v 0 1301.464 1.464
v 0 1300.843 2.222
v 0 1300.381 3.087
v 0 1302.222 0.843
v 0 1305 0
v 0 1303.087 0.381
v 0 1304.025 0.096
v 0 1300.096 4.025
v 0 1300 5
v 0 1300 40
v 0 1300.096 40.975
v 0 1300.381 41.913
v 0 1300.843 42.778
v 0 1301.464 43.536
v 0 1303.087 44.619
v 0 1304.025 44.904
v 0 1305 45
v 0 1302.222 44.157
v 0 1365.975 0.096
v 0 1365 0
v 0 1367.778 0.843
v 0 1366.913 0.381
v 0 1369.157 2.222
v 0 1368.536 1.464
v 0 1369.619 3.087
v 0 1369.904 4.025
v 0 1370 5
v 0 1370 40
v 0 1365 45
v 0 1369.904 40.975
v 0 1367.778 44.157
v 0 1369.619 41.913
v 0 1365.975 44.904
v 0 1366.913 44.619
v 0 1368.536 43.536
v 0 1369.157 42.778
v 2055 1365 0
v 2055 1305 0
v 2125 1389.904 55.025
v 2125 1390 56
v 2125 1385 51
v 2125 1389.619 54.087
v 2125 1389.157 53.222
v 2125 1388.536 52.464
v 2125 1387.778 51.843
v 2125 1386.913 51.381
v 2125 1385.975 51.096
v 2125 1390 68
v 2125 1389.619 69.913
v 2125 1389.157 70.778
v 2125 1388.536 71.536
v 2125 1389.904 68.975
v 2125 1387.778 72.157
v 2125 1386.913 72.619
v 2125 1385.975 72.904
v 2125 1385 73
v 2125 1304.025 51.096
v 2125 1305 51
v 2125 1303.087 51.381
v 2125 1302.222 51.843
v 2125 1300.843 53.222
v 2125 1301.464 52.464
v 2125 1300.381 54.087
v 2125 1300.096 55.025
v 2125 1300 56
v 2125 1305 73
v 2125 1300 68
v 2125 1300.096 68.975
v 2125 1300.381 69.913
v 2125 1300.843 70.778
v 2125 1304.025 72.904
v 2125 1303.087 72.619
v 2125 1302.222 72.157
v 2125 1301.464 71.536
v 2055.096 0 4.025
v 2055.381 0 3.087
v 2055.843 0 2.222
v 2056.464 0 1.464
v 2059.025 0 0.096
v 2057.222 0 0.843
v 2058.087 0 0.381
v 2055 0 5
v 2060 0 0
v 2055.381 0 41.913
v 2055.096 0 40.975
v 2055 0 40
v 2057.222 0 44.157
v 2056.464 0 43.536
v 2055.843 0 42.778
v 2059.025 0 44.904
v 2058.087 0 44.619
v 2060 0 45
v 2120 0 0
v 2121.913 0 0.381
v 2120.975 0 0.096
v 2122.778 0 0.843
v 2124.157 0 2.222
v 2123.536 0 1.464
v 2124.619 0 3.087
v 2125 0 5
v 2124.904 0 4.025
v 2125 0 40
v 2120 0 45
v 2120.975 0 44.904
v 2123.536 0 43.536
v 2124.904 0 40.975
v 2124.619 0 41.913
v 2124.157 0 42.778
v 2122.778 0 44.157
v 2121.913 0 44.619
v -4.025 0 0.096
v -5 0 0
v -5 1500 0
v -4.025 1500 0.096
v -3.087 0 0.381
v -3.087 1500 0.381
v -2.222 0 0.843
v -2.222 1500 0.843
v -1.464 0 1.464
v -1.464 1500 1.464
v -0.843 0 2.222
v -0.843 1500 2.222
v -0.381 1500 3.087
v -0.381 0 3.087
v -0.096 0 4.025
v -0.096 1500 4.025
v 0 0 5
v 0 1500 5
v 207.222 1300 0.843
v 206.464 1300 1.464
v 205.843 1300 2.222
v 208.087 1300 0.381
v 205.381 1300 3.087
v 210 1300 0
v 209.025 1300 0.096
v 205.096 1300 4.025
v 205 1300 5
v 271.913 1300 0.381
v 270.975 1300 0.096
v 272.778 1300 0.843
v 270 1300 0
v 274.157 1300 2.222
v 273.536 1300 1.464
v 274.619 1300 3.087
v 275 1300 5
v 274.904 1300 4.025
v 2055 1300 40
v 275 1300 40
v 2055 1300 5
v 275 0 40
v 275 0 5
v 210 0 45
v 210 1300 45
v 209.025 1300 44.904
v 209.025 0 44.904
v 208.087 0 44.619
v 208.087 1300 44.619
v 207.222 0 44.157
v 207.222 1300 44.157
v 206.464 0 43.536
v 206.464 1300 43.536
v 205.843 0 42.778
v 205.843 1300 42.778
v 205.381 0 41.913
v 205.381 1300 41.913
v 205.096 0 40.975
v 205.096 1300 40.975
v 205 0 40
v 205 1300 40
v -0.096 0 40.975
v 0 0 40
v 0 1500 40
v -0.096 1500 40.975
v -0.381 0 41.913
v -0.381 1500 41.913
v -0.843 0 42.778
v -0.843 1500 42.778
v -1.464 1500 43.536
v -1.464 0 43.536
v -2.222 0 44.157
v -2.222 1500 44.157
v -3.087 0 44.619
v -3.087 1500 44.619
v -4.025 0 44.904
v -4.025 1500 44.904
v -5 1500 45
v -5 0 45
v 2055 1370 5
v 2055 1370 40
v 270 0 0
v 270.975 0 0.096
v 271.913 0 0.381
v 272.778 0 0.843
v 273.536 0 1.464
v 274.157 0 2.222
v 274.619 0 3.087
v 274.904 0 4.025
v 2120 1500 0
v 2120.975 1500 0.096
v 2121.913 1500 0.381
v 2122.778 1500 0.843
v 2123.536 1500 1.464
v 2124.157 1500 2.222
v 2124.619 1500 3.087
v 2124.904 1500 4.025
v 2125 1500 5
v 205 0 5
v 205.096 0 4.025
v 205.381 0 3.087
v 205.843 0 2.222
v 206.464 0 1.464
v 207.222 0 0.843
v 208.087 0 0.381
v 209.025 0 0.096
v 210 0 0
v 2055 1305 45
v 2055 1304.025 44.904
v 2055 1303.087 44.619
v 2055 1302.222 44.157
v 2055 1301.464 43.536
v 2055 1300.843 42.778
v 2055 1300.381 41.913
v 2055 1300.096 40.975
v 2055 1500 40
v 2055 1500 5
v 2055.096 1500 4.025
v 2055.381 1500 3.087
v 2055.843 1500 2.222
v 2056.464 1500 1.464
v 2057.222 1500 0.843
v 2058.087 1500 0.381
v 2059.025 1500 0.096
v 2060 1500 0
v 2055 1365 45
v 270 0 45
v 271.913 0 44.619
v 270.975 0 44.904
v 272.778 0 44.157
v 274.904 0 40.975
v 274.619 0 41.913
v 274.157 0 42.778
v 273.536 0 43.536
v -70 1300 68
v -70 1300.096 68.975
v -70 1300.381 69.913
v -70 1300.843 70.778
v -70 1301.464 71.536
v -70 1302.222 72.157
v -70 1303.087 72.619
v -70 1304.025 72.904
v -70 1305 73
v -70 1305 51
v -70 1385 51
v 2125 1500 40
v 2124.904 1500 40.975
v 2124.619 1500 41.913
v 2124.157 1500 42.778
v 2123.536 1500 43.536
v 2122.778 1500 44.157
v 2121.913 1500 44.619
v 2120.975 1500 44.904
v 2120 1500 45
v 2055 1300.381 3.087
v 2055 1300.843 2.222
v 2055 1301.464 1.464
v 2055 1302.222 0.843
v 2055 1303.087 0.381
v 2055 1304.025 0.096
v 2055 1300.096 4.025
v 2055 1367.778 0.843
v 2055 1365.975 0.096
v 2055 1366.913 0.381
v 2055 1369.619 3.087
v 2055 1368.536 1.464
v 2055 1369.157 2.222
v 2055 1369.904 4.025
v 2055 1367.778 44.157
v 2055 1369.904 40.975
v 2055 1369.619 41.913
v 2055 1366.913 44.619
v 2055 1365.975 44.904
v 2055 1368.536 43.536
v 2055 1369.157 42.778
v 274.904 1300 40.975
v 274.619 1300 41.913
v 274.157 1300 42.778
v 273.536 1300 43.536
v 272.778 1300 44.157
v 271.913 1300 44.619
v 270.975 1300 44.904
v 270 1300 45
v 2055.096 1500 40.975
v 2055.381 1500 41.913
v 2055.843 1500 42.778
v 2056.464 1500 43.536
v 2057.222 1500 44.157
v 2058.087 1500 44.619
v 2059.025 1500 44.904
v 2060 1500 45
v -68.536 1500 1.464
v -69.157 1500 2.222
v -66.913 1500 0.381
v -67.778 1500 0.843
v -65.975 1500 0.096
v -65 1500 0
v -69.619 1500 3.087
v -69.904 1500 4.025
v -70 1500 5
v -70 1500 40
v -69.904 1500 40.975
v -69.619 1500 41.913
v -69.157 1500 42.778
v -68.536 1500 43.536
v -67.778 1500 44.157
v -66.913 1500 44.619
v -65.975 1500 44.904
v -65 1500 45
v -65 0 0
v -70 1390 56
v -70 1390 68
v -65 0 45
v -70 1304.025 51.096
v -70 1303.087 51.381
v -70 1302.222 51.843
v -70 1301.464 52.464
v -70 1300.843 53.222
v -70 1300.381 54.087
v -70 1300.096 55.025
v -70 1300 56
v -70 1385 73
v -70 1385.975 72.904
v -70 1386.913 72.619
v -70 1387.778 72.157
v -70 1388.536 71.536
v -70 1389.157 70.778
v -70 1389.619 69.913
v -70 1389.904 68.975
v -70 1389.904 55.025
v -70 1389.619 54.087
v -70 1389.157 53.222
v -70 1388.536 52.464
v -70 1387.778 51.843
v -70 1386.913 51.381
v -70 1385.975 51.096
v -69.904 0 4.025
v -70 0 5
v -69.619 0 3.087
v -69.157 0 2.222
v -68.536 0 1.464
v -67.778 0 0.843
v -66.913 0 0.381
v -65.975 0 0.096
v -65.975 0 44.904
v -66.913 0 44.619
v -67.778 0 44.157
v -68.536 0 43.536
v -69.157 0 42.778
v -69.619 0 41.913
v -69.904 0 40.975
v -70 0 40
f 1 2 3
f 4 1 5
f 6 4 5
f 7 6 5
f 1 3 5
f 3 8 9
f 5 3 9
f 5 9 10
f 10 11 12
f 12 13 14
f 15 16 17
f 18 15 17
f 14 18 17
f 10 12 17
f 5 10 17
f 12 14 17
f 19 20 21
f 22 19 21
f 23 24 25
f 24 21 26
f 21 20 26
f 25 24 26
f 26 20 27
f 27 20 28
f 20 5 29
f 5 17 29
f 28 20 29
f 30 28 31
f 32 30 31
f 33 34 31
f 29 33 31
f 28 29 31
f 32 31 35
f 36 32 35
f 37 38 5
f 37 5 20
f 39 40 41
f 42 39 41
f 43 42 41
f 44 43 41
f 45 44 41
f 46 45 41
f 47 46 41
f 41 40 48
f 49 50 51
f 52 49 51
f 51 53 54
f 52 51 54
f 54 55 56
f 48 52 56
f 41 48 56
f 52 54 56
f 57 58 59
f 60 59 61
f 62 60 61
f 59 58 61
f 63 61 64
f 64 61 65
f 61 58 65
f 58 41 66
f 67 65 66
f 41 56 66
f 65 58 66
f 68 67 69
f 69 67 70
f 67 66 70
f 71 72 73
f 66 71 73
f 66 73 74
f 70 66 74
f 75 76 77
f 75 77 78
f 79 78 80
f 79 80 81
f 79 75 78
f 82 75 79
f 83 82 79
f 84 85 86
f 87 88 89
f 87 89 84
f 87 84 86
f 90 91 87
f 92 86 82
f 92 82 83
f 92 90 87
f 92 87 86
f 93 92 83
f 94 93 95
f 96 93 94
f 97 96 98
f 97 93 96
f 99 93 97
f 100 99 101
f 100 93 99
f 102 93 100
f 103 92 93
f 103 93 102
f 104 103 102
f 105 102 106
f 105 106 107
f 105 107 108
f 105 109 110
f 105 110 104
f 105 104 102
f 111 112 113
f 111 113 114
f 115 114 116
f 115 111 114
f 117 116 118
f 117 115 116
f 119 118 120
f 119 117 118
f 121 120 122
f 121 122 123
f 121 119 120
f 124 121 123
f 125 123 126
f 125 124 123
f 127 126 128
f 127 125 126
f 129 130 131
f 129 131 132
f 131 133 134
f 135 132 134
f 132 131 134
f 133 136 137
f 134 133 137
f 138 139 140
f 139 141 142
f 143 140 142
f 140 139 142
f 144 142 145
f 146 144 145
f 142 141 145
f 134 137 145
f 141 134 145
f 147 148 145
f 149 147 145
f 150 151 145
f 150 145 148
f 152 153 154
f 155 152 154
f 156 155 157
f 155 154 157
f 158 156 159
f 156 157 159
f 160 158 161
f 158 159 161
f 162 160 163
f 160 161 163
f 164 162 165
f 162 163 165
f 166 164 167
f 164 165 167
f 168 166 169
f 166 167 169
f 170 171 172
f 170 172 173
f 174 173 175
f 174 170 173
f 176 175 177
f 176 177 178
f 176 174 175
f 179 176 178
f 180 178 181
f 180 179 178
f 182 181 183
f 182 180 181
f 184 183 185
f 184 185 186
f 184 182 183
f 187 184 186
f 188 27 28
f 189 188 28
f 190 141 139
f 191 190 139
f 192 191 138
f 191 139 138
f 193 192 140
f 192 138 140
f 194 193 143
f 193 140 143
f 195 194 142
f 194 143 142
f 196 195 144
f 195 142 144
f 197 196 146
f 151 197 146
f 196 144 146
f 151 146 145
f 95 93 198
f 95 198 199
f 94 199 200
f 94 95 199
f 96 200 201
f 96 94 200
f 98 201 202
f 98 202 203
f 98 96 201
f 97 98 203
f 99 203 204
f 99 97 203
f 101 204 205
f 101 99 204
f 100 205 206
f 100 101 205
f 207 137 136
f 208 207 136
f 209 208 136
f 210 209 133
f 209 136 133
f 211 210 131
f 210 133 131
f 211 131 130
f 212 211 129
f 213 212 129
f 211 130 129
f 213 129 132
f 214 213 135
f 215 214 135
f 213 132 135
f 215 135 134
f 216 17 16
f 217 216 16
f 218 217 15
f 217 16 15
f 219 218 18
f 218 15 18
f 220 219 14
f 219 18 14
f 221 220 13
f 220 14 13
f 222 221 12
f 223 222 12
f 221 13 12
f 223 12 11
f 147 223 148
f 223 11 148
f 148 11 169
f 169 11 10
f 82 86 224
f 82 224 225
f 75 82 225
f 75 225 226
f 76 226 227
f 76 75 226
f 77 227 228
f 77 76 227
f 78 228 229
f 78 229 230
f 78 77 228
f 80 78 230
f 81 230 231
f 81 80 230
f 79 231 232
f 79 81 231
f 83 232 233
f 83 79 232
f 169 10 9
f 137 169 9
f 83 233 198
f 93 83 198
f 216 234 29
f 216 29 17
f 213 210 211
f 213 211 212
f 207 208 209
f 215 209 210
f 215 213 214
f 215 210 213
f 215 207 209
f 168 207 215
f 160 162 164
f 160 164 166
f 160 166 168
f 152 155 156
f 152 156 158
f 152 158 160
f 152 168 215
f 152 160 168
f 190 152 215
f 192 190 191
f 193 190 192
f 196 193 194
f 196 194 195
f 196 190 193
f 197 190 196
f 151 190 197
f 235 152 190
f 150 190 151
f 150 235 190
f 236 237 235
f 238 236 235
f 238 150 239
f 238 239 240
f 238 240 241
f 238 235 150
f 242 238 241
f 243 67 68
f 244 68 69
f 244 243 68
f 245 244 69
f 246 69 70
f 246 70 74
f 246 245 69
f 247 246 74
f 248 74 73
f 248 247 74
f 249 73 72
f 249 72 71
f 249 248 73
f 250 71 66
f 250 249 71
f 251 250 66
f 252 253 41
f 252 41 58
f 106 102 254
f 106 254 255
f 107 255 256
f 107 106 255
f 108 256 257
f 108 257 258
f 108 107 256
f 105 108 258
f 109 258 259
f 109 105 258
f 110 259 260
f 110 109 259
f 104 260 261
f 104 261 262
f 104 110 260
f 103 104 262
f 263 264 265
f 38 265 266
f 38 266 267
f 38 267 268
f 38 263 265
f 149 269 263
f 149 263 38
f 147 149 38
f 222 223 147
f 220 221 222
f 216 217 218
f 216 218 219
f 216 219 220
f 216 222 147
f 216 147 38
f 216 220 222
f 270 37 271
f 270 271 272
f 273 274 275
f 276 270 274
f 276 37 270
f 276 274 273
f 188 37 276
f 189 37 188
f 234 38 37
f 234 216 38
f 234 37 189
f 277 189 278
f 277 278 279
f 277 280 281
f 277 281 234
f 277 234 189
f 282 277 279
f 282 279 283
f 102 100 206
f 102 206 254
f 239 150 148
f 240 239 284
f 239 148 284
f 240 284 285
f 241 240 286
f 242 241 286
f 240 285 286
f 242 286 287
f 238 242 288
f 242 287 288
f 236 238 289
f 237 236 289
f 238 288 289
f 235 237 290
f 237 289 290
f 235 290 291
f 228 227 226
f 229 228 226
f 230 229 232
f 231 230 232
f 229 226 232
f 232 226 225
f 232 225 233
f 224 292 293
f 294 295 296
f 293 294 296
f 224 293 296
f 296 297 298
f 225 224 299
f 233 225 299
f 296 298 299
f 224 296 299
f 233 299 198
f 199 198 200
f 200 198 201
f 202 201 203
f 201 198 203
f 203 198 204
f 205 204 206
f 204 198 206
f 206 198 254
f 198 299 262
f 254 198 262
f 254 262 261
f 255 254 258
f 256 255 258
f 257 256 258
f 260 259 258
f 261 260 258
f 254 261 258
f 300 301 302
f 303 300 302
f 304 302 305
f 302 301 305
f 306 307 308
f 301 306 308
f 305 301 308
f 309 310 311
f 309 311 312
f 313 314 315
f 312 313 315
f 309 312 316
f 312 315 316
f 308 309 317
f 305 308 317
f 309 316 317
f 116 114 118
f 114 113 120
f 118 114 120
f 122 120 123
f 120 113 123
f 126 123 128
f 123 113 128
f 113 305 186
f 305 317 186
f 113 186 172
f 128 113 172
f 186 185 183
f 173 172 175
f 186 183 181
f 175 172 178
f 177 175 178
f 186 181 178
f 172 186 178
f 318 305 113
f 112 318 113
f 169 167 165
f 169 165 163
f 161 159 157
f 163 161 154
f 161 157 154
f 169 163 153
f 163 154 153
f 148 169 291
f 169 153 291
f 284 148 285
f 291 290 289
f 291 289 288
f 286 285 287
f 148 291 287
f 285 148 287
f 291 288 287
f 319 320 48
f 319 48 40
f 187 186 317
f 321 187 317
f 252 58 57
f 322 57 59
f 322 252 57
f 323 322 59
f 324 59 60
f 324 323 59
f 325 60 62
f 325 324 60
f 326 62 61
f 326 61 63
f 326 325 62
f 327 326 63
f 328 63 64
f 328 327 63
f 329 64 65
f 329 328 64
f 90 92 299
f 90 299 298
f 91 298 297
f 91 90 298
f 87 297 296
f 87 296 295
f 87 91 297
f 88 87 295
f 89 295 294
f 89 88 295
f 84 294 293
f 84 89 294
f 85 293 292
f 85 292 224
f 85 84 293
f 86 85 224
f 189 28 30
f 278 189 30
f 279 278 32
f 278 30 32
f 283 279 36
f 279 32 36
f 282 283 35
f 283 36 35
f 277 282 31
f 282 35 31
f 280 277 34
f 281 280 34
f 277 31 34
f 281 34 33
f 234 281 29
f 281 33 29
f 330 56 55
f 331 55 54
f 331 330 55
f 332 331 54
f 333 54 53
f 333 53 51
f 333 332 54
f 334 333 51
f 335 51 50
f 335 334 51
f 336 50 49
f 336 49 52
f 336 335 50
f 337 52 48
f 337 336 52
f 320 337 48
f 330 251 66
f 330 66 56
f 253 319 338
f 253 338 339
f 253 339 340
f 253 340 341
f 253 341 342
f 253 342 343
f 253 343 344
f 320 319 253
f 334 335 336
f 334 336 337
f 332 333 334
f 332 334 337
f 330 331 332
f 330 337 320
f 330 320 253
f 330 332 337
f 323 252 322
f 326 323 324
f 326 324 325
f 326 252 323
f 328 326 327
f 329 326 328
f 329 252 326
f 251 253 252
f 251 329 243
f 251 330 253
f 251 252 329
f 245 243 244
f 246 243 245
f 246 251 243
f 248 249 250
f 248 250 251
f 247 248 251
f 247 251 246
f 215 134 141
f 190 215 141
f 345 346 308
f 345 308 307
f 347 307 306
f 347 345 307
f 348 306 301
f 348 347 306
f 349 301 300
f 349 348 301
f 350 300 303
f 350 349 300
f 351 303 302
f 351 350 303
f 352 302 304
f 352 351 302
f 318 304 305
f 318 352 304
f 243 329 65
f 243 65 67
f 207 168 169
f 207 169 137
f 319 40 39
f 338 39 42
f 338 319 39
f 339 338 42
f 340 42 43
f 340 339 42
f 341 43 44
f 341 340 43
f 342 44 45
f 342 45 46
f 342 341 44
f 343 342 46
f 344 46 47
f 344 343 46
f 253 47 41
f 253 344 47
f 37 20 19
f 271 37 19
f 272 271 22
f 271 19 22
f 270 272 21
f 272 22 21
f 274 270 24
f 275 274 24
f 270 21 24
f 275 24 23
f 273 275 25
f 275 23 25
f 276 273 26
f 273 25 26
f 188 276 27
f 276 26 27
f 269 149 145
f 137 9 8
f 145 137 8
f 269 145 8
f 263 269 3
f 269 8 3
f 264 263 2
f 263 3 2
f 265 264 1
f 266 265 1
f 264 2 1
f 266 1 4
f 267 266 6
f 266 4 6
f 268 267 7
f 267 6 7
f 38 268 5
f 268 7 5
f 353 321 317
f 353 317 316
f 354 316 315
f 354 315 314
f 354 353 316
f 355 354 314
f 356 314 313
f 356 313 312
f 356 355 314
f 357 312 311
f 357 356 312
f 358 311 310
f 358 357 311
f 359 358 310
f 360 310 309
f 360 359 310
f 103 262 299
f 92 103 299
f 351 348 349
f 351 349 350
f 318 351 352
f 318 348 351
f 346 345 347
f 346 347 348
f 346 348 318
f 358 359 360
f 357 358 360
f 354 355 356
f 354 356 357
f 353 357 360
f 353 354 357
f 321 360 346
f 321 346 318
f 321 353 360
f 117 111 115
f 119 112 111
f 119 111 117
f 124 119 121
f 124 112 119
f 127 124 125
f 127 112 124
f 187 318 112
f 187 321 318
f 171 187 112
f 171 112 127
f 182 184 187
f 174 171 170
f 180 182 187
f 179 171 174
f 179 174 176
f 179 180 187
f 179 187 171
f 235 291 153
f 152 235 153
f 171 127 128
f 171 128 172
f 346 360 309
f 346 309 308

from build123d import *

# Parameters (mm, degrees)
F1_DEPTH = 1500
F3_DEPTH = 2055
F5_DEPTH = 1300
F7_DEPTH = 2195


with BuildPart() as f1:
    # F0 (on Front) → F1 (new body)
    with BuildSketch(Plane.XZ):
        with BuildLine():
            Line((-65, 0), (-5, 0))
            ThreePointArc((-5, 0), (-1.464466, 1.464466), (0, 5))
            Line((0, 5), (0, 40))
            ThreePointArc((0, 40), (-1.464466, 43.535534), (-5, 45))
            Line((-5, 45), (-65, 45))
            ThreePointArc((-65, 45), (-68.535534, 43.535534), (-70, 40))
            Line((-70, 40), (-70, 5))
            ThreePointArc((-70, 5), (-68.535534, 1.464466), (-65, 0))
        make_face()
        with BuildLine():
            ThreePointArc((2055, 5), (2056.464466, 1.464466), (2060, 0))
            Line((2060, 0), (2120, 0))
            ThreePointArc((2120, 0), (2123.535534, 1.464466), (2125, 5))
            Line((2125, 5), (2125, 40))
            ThreePointArc((2125, 40), (2123.535534, 43.535534), (2120, 45))
            Line((2120, 45), (2060, 45))
            ThreePointArc((2060, 45), (2056.464466, 43.535534), (2055, 40))
            Line((2055, 40), (2055, 5))
        make_face()
    extrude(amount=-F1_DEPTH)


with BuildPart() as f3:
    # F2 (on face) → F3 (new body)
    with BuildSketch(Plane.YZ):
        with BuildLine():
            Line((1365, 45), (1305, 45))
            ThreePointArc((1305, 45), (1301.464466, 43.535534), (1300, 40))
            Line((1300, 40), (1300, 5))
            ThreePointArc((1300, 5), (1301.464466, 1.464466), (1305, 0))
            Line((1305, 0), (1365, 0))
            ThreePointArc((1365, 0), (1368.535534, 1.464466), (1370, 5))
            Line((1370, 5), (1370, 40))
            ThreePointArc((1370, 40), (1368.535534, 43.535534), (1365, 45))
        make_face()
    extrude(amount=F3_DEPTH)

    # F4 (on face) → F5 (join)
    with BuildSketch(Plane.XZ.offset(-1300)):
        with BuildLine():
            Line((270, 45), (210, 45))
            ThreePointArc((210, 45), (206.464466, 43.535534), (205, 40))
            Line((205, 40), (205, 5))
            ThreePointArc((205, 5), (206.464466, 1.464466), (210, 0))
            Line((210, 0), (270, 0))
            ThreePointArc((270, 0), (273.535534, 1.464466), (275, 5))
            Line((275, 5), (275, 40))
            ThreePointArc((275, 40), (273.535534, 43.535534), (270, 45))
        make_face()
    extrude(amount=F5_DEPTH)


with BuildPart() as f7:
    # F6 (on face) → F7 (new body, through all)
    with BuildSketch(Plane(origin=(-70, 0, 0), x_dir=(0, -1, 0), z_dir=(-1, 0, 0))):
        with BuildLine():
            ThreePointArc((-1300, 68), (-1301.464466, 71.535534), (-1305, 73))
            Line((-1305, 73), (-1385, 73))
            ThreePointArc((-1385, 73), (-1388.535534, 71.535534), (-1390, 68))
            Line((-1390, 68), (-1390, 56))
            ThreePointArc((-1390, 56), (-1388.535534, 52.464466), (-1385, 51))
            Line((-1385, 51), (-1305, 51))
            ThreePointArc((-1305, 51), (-1301.464466, 52.464466), (-1300, 56))
            Line((-1300, 56), (-1300, 68))
        make_face()
    extrude(amount=-F7_DEPTH)


solid = Compound([f1.part, f3.part, f7.part])
